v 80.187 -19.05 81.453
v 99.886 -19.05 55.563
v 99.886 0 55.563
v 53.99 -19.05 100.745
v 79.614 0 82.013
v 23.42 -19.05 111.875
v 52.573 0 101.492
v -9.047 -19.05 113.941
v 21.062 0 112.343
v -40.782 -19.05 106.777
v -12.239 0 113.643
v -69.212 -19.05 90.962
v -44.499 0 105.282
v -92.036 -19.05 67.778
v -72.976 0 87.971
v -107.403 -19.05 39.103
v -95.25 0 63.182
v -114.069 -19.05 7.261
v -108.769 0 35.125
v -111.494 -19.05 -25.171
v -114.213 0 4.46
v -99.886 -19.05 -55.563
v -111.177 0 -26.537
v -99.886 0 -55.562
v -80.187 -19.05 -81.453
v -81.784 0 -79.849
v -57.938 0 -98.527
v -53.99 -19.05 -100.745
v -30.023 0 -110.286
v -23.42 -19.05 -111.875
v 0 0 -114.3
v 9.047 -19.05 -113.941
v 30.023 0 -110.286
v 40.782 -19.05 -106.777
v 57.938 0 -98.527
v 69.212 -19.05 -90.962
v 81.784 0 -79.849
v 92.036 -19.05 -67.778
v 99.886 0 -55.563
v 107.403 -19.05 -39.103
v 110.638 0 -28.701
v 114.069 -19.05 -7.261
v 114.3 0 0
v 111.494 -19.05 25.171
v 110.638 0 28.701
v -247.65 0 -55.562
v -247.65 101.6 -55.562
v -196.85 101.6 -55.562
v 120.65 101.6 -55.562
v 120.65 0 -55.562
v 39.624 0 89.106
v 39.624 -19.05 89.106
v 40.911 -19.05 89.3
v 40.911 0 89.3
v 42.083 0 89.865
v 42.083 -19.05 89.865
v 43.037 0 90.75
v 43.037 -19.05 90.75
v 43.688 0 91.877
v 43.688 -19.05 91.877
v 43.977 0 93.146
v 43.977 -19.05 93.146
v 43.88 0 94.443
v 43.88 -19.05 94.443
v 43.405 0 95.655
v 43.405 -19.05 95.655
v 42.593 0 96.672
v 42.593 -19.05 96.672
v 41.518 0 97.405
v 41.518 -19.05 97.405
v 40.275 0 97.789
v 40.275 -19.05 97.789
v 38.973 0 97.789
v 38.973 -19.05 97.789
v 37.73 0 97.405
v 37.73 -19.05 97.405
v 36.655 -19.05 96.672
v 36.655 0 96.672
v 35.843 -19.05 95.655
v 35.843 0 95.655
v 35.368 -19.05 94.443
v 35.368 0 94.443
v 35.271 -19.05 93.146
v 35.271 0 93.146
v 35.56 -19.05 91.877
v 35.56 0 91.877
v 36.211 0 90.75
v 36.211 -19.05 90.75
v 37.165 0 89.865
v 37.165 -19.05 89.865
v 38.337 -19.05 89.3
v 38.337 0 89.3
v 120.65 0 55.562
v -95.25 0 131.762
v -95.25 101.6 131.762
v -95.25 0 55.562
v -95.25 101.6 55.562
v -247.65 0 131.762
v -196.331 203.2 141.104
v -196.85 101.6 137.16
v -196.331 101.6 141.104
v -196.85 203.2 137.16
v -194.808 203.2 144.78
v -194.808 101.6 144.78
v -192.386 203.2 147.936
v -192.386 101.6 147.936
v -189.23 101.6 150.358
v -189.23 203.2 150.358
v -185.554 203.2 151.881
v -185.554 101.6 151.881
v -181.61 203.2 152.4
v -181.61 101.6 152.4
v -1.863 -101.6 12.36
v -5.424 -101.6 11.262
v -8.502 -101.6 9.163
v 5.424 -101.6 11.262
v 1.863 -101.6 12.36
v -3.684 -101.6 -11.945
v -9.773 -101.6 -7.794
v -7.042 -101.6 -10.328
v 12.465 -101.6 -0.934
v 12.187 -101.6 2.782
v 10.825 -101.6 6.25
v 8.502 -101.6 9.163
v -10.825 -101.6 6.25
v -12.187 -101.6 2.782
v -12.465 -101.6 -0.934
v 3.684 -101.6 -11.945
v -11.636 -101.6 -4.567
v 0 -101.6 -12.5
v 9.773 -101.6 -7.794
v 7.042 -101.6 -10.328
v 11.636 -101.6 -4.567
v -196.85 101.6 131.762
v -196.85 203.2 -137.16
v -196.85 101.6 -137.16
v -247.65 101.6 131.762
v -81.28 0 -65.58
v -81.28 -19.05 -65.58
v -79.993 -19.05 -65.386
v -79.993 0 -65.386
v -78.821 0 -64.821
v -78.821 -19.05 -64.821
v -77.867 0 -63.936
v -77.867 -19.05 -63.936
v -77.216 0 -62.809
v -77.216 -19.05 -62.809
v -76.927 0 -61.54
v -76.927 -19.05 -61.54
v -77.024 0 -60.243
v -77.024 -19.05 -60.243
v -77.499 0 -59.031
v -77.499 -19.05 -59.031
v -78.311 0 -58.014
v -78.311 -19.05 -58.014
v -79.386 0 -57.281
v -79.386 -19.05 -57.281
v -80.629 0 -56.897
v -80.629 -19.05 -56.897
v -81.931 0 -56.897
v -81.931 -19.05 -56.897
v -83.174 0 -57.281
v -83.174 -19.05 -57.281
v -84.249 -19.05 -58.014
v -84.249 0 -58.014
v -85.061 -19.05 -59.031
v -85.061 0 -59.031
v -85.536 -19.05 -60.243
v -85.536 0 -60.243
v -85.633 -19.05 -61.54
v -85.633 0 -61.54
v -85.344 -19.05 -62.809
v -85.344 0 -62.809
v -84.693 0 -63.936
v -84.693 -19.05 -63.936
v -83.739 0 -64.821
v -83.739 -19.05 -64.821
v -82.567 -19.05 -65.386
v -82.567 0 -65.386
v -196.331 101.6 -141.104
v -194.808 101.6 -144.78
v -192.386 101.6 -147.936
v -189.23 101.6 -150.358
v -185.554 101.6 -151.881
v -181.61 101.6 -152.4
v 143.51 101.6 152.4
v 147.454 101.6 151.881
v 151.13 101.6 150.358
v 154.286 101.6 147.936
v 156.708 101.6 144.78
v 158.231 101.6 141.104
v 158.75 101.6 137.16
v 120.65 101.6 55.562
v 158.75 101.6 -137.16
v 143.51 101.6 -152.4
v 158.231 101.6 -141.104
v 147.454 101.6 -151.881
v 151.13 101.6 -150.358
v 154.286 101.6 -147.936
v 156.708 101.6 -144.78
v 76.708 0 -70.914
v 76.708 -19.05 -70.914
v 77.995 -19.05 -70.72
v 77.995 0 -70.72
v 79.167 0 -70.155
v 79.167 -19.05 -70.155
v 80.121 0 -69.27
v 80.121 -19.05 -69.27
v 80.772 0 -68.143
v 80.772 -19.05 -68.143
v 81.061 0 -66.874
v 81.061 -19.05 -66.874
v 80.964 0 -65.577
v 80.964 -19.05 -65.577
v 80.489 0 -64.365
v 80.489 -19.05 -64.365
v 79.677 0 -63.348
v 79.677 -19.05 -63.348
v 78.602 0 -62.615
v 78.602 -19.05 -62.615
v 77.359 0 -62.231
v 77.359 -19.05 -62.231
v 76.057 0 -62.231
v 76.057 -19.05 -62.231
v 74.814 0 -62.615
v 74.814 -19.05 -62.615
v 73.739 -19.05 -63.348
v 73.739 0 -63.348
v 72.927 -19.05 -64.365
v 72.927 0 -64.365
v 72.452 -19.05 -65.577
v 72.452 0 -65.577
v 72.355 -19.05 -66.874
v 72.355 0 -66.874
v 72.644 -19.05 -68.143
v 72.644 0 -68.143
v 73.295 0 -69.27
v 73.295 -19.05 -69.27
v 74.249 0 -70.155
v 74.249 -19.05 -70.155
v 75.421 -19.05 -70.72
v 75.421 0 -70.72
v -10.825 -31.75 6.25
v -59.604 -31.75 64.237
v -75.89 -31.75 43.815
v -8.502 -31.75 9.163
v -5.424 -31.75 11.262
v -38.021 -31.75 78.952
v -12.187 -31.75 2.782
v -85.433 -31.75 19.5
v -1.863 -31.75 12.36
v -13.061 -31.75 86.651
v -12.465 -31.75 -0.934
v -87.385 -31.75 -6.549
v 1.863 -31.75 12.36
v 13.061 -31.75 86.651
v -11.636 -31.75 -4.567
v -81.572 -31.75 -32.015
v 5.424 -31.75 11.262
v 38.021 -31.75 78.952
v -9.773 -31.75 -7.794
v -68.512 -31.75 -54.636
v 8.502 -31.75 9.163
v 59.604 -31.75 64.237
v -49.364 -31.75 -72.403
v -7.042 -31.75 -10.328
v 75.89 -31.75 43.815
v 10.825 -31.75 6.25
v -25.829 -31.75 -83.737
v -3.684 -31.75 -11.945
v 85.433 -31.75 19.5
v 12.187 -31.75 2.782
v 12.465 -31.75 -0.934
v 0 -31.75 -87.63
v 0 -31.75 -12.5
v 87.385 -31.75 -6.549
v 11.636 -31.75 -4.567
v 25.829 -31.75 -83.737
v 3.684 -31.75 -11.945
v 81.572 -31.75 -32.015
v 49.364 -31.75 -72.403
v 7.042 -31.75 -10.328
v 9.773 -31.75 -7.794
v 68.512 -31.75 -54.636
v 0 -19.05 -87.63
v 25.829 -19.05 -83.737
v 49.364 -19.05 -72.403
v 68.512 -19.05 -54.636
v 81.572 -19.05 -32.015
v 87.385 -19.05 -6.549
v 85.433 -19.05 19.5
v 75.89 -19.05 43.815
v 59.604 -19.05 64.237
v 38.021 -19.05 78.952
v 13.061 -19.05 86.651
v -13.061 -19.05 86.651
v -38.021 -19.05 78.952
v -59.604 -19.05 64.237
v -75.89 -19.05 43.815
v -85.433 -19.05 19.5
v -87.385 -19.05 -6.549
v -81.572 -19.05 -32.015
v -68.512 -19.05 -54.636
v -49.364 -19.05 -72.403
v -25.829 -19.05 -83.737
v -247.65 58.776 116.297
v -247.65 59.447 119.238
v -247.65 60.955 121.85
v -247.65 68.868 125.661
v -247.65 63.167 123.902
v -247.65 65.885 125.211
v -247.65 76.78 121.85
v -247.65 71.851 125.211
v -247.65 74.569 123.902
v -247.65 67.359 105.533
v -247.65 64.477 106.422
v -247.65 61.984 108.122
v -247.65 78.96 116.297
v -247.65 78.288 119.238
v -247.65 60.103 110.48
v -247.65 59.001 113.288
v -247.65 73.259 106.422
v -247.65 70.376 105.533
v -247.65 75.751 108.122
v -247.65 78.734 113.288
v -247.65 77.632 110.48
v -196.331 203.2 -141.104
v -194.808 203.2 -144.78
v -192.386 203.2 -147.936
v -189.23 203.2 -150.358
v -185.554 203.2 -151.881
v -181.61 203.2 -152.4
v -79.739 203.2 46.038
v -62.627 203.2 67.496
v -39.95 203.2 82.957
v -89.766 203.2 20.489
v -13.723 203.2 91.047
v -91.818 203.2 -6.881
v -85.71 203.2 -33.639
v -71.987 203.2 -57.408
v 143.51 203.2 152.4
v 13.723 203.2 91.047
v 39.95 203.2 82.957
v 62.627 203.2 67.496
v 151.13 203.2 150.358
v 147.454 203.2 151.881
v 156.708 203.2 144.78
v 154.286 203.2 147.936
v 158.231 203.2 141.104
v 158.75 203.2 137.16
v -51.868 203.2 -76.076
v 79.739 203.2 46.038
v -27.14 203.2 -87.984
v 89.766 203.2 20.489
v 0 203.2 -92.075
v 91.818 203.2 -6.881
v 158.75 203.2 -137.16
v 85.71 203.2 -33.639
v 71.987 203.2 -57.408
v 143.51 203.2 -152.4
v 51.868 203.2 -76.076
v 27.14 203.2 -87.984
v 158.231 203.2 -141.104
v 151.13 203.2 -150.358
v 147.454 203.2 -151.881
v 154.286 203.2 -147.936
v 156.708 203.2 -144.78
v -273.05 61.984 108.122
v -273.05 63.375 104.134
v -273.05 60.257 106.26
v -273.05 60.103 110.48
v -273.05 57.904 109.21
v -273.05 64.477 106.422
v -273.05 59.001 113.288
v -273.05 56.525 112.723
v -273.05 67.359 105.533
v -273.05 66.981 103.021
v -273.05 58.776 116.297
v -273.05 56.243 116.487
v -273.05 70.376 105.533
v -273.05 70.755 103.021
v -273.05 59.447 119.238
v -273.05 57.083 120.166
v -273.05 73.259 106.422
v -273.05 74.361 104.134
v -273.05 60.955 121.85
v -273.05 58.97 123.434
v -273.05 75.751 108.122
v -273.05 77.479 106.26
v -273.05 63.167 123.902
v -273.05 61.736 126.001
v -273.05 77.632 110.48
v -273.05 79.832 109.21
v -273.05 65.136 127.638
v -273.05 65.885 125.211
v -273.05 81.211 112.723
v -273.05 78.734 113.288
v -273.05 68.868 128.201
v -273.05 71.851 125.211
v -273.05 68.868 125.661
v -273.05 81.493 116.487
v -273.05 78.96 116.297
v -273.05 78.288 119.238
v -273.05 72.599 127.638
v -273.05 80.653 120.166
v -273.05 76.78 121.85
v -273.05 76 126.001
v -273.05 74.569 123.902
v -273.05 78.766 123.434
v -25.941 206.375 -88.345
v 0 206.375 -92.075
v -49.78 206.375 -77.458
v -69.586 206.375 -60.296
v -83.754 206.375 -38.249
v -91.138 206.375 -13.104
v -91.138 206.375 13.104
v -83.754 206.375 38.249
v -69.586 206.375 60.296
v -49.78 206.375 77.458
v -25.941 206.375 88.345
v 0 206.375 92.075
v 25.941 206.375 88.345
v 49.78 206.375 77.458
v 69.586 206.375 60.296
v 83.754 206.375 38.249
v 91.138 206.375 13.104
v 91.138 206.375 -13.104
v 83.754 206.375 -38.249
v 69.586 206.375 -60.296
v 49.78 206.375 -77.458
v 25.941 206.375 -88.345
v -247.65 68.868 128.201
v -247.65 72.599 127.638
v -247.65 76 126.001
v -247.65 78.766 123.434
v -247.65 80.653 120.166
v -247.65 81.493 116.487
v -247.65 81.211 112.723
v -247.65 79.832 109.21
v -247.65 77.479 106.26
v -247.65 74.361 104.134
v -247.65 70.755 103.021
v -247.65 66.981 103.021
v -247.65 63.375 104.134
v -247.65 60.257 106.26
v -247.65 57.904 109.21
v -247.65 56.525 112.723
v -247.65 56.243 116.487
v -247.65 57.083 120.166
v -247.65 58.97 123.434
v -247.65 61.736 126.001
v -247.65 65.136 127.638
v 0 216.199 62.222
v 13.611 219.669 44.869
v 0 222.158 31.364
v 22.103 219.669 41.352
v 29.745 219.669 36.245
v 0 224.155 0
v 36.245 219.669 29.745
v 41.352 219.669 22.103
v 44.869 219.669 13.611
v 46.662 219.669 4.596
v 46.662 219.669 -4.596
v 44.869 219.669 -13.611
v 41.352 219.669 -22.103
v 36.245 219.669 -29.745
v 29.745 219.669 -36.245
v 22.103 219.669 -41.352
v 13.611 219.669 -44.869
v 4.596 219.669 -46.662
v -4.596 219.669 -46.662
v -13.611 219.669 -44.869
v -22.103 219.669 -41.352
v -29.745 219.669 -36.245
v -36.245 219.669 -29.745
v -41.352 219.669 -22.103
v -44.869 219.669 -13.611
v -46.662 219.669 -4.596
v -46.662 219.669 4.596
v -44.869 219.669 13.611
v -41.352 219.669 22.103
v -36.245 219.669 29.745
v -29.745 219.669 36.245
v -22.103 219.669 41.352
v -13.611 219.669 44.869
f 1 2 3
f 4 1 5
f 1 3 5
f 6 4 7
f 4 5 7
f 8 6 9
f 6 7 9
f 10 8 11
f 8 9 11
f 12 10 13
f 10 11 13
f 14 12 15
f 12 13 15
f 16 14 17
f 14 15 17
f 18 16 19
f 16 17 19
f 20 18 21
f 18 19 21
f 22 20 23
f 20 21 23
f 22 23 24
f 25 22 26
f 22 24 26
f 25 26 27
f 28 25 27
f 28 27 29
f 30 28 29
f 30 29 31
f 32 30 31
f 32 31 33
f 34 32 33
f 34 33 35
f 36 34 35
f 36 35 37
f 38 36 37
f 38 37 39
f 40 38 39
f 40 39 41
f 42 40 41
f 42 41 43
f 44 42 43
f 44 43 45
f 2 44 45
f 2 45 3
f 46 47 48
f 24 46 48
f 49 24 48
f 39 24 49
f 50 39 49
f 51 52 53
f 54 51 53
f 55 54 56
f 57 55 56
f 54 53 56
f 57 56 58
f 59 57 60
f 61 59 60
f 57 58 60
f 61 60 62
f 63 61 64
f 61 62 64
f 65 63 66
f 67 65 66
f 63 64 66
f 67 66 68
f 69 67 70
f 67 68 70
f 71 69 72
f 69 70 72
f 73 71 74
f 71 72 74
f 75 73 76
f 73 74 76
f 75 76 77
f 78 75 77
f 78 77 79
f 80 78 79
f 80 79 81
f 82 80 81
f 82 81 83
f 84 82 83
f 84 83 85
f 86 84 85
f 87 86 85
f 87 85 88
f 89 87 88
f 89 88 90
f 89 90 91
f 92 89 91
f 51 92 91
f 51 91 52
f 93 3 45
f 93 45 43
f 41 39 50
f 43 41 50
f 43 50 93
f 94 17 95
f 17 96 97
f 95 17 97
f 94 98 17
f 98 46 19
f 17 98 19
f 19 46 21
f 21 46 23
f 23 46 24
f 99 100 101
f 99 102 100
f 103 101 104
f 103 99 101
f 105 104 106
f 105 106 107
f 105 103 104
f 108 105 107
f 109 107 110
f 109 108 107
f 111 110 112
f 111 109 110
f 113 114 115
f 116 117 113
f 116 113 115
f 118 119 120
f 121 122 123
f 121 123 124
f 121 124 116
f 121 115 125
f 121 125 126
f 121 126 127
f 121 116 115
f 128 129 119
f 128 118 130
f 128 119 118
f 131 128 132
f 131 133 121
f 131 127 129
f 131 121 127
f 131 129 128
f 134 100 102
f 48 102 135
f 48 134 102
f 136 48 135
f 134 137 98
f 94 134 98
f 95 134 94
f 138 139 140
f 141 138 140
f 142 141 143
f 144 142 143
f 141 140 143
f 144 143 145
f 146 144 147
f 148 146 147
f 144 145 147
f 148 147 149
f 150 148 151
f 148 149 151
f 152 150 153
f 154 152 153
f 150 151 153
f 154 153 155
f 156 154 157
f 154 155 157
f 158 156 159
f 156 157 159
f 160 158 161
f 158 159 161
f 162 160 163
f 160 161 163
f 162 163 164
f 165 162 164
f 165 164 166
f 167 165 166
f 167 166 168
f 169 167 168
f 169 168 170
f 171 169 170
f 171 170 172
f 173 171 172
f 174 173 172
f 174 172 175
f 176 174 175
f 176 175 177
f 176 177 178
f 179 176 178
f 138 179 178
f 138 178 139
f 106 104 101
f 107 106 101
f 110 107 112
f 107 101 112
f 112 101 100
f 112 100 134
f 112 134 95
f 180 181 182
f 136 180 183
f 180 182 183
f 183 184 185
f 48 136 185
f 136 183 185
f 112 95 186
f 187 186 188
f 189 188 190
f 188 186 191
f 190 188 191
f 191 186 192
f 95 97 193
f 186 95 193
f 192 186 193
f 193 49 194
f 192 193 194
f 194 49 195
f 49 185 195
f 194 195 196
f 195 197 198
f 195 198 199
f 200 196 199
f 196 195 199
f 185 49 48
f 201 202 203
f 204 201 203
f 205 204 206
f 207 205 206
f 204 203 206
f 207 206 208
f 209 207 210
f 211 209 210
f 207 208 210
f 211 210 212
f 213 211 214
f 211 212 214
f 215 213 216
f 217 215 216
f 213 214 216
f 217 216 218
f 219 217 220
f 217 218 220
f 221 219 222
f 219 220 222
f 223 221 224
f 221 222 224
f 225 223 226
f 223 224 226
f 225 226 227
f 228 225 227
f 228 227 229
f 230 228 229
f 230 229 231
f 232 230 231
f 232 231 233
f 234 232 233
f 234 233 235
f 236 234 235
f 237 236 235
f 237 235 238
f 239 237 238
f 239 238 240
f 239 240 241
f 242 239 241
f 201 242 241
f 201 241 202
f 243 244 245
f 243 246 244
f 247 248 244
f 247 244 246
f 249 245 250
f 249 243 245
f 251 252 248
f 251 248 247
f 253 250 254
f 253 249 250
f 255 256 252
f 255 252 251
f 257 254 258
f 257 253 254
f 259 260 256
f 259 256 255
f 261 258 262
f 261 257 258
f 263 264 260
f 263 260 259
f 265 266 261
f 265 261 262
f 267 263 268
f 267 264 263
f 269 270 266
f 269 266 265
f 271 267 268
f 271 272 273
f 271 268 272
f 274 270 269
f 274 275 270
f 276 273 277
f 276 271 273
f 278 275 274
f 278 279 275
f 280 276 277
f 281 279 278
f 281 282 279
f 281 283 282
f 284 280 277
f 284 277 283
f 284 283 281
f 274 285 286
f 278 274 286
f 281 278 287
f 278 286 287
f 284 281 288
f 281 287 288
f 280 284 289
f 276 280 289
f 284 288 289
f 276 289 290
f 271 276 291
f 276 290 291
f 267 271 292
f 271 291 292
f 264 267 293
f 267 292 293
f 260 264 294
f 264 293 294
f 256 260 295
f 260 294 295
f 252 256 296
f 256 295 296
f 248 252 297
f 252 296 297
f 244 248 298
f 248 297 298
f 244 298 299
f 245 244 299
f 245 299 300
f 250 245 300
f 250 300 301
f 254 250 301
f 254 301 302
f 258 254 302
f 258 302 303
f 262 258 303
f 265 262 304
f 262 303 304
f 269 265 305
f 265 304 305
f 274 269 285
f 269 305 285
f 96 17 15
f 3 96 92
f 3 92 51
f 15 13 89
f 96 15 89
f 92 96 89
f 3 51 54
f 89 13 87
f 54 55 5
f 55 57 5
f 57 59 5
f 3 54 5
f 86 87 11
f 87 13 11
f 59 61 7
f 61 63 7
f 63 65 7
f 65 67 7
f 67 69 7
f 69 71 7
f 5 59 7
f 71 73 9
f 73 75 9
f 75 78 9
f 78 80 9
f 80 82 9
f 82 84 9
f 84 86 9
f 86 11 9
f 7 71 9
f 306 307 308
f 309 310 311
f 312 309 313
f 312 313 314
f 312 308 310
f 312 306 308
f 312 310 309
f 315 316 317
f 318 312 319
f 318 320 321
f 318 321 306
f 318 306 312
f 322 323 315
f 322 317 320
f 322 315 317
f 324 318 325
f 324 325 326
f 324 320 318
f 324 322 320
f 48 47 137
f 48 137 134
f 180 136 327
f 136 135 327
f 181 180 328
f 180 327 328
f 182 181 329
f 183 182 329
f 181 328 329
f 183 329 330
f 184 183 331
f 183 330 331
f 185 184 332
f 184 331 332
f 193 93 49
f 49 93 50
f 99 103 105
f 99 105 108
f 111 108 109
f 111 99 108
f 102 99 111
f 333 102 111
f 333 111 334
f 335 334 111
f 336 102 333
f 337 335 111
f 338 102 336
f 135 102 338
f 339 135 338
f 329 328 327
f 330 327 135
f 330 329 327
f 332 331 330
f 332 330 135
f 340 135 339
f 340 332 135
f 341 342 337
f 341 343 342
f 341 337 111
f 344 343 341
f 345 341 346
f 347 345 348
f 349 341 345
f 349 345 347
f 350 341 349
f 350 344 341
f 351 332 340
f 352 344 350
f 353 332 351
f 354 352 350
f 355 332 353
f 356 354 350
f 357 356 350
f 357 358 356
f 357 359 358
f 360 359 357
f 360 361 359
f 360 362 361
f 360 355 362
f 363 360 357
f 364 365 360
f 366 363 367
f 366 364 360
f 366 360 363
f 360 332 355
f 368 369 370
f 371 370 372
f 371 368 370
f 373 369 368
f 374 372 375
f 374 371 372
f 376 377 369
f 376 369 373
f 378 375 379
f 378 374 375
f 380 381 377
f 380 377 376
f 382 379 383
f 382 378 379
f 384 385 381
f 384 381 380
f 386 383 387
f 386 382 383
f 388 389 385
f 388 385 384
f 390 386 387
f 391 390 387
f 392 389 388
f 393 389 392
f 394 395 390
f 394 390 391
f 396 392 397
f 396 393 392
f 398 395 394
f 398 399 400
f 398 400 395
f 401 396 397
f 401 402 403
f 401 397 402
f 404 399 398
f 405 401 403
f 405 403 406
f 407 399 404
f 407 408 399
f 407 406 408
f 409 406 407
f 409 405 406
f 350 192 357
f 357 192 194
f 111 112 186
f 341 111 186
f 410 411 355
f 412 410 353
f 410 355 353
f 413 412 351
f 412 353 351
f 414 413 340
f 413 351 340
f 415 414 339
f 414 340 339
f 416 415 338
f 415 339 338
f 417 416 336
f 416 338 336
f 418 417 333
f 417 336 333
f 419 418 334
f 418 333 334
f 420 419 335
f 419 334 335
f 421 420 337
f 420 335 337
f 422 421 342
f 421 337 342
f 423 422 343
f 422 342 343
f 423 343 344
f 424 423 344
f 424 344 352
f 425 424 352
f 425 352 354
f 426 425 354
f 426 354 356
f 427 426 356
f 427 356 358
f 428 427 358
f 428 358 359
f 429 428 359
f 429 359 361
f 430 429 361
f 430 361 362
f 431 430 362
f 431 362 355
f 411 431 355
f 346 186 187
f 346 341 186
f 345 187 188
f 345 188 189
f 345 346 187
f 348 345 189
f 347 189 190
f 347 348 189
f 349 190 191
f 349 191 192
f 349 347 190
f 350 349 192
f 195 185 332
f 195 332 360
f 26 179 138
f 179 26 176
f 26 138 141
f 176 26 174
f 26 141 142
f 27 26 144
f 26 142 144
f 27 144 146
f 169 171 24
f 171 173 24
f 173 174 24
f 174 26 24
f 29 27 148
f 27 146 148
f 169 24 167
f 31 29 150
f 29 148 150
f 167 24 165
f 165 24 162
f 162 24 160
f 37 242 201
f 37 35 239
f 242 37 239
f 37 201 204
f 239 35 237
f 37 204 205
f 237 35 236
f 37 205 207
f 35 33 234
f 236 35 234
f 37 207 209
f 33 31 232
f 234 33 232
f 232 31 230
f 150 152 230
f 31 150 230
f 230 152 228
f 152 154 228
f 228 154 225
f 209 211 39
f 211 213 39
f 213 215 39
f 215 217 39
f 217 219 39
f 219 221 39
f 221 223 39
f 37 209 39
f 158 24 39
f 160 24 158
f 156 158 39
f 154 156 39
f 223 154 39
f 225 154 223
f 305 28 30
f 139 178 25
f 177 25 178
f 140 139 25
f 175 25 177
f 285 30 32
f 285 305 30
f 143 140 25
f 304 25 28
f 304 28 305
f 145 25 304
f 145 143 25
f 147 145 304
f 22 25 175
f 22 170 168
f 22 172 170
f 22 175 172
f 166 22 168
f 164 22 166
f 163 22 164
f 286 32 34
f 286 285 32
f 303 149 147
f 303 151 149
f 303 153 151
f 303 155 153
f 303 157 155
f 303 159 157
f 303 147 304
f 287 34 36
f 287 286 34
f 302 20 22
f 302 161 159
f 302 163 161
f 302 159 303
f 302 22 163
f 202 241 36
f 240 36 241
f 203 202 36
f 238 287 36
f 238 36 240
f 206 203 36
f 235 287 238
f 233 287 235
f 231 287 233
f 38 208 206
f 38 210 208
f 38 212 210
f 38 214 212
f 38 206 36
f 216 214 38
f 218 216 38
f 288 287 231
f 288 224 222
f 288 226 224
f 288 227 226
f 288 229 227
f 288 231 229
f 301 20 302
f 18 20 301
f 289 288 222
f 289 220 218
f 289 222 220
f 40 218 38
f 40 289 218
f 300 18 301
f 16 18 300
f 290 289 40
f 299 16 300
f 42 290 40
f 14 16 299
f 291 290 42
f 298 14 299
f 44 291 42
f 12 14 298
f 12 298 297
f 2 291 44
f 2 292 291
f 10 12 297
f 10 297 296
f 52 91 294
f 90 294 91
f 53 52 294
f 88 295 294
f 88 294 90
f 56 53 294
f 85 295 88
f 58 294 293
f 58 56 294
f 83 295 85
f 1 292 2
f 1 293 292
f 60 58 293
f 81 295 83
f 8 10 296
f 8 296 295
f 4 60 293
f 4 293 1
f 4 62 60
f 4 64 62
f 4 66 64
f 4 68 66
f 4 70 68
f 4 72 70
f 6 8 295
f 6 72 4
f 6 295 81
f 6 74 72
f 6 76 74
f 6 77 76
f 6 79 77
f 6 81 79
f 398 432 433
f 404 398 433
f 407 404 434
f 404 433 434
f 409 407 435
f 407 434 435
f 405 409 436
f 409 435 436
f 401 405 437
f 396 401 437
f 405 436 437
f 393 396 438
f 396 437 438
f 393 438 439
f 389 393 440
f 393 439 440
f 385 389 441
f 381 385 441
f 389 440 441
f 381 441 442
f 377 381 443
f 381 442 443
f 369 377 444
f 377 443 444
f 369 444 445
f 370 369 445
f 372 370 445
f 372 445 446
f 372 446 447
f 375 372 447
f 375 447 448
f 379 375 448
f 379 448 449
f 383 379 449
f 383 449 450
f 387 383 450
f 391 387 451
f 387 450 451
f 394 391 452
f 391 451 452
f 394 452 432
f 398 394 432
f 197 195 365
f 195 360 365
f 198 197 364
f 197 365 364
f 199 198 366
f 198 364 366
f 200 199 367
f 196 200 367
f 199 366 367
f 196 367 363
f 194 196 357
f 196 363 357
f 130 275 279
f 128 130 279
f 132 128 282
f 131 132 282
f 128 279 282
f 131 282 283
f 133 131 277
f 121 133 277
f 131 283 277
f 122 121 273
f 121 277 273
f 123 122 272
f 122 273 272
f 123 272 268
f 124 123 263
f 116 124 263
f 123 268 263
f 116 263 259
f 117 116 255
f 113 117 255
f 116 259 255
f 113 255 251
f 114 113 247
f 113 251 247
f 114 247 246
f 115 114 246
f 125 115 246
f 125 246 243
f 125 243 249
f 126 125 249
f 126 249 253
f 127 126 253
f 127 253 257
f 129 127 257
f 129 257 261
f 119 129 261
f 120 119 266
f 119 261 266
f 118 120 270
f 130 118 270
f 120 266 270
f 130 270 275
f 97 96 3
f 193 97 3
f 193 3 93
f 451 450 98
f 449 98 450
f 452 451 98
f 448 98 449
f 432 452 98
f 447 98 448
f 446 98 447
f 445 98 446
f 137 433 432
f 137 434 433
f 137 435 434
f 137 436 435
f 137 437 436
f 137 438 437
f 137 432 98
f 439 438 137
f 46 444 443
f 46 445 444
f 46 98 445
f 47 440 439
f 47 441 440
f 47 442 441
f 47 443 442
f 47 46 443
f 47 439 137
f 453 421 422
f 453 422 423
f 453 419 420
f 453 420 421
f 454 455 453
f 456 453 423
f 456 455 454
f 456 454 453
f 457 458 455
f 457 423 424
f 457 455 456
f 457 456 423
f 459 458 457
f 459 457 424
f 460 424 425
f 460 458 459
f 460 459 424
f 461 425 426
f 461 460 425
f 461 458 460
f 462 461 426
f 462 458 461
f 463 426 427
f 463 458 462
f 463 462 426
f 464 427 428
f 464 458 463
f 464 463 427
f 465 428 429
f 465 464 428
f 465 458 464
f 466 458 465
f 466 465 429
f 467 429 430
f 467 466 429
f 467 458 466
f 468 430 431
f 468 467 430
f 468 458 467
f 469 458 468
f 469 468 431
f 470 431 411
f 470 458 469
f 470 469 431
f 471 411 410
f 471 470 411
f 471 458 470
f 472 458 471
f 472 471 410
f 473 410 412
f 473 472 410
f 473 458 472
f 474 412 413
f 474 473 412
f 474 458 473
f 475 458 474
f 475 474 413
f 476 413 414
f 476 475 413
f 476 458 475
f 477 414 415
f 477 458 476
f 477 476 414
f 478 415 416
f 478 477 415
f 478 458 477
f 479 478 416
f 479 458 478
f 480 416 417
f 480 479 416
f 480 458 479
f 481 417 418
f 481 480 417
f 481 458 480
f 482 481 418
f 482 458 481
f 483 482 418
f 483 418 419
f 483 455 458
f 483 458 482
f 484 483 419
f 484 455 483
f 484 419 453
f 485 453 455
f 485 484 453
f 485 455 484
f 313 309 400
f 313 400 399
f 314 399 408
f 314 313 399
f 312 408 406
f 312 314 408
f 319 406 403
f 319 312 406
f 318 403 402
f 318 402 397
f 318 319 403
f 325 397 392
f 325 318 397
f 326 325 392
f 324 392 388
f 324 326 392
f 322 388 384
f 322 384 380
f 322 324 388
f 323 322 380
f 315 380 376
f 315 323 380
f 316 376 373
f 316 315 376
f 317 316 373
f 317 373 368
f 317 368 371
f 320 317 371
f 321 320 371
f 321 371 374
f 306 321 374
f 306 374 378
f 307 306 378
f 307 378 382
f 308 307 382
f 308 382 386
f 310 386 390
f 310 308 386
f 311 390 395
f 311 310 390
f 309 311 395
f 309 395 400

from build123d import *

# Parameters (mm, degrees)
SKETCH1_W           = 368.3
SKETCH1_H           = 111.125
BOSS_EXTRUDE1_DEPTH = 101.6
SKETCH2_R           = 114.3
BOSS_EXTRUDE2_DEPTH = 19.05
SKETCH3_R           = 87.63
BOSS_EXTRUDE3_DEPTH = 12.7
SKETCH4_R           = 12.5
BOSS_EXTRUDE4_DEPTH = 69.85
SKETCH5_W           = 355.6
SKETCH5_H           = 304.8
BOSS_EXTRUDE5_DEPTH = 101.6
SKETCH6_R           = 92.075
BOSS_EXTRUDE6_DEPTH = 3.175
DOME1_FACE_RADIUS   = 92.075
DOME1_HEIGHT        = 17.78
FILLET1_R           = 15.24
SKETCH7_W           = 152.4
SKETCH7_H           = 101.6
BOSS_EXTRUDE7_DEPTH = 76.2
SKETCH8_R           = 12.660326574
SKETCH8_R_2         = 10.120326574
EXTRUDE_THIN1_DEPTH = 25.4
CUT_EXTRUDE1_REACH  = 245.205
SKETCH9_R           = 4.365625


with BuildPart() as part:
    # Sketch1 → Boss-Extrude1 (new body)
    with BuildSketch(Plane(origin=(0, 0, 0), x_dir=(1, 0, 0), z_dir=(0, 1, 0))):
        with Locations((-63.5, 0)):
            Rectangle(SKETCH1_W, SKETCH1_H)
    extrude(amount=BOSS_EXTRUDE1_DEPTH)

    # Sketch2 → Boss-Extrude2 (add)
    with BuildSketch(Plane.XZ):
        with Locations(Location((0, 0, 0), (0, 0, 29.085295061))):  # turned: the seam where the file's is
            Circle(SKETCH2_R)
    extrude(amount=BOSS_EXTRUDE2_DEPTH)

    # Sketch3 → Boss-Extrude3 (add)
    with BuildSketch(Plane.XZ.offset(19.05)):
        with Locations(Location((0, 0, 0), (0, 0, 270))):  # turned: the seam where the file's is
            Circle(SKETCH3_R)
    extrude(amount=BOSS_EXTRUDE3_DEPTH)

    # Sketch4 → Boss-Extrude4 (add)
    with BuildSketch(Plane.XZ.offset(31.75)):
        with Locations(Location((0, 0, 0), (0, 0, 270))):  # turned: the seam where the file's is
            Circle(SKETCH4_R)
    extrude(amount=BOSS_EXTRUDE4_DEPTH)

    # Sketch5 → Boss-Extrude5 (add)
    with BuildSketch(Plane(origin=(0, 101.6, 0), x_dir=(1, 0, 0), z_dir=(0, 1, 0))):
        with Locations((-19.05, 0)):
            Rectangle(SKETCH5_W, SKETCH5_H)
    extrude(amount=BOSS_EXTRUDE5_DEPTH)

    # Sketch6 → Boss-Extrude6 (add)
    with BuildSketch(Plane(origin=(0, 203.2, 0), x_dir=(1, 0, 0), z_dir=(0, 1, 0))):
        with Locations(Location((0, 0, 0), (0, 0, 90))):  # turned: the seam where the file's is
            Circle(SKETCH6_R)
    extrude(amount=BOSS_EXTRUDE6_DEPTH)

    # Dome1: a dome of height H over a round flat face of radius A is a cap of a sphere of radius (A * A + H * H) / (2 * H)
    dome1_r = (DOME1_FACE_RADIUS * DOME1_FACE_RADIUS + DOME1_HEIGHT * DOME1_HEIGHT) / (2 * DOME1_HEIGHT)
    dome1_base = Plane((0, 206.375, 0), z_dir=(0, 1, 0))
    with Locations(dome1_base.offset(DOME1_HEIGHT - dome1_r)):
        dome1_ball = Sphere(dome1_r, mode=Mode.PRIVATE)
    add(split(dome1_ball, bisect_by=dome1_base, keep=Keep.TOP, mode=Mode.PRIVATE))

    # Fillet1
    fillet1_edges = [part.edges().sort_by_distance(p)[0] for p in [
        (158.75, 152.4, 152.4),
        (158.75, 152.4, -152.4),
        (-196.85, 152.4, -152.4),
        (-196.85, 152.4, 152.4),
    ]]
    fillet(fillet1_edges, radius=FILLET1_R)

    # Sketch7 → Boss-Extrude7 (add)
    with BuildSketch(Plane.XY.offset(55.5625)):
        with Locations((-171.45, 50.8)):
            Rectangle(SKETCH7_W, SKETCH7_H)
    extrude(amount=BOSS_EXTRUDE7_DEPTH)

    # Sketch8 → Extrude-Thin1 (add)
    with BuildSketch(Plane.ZY.offset(247.65)):
        with Locations((115.540395057, 68.867744931)):
            Circle(SKETCH8_R)
        with Locations((115.540395057, 68.867744931)):
            Circle(SKETCH8_R_2, mode=Mode.SUBTRACT)
    extrude(amount=EXTRUDE_THIN1_DEPTH)

    # Sketch9 → Cut-Extrude1 (cut, up to next)
    with BuildSketch(Plane.XZ.offset(19.05), mode=Mode.PRIVATE) as cut_extrude1_sk1:
        with Locations(Location((39.624, 93.472, 0), (0, 0, 270))):  # turned: the seam where the file's is
            Circle(SKETCH9_R)
    cut_extrude1_tool1 = extrude(cut_extrude1_sk1.sketch, amount=-CUT_EXTRUDE1_REACH, mode=Mode.PRIVATE) & part.part
    add(cut_extrude1_tool1.solids().sort_by_distance((39.624, -19.05, 93.472))[0], mode=Mode.SUBTRACT)
    # Sketch9 → Cut-Extrude1 (cut, up to next)
    with BuildSketch(Plane.XZ.offset(19.05), mode=Mode.PRIVATE) as cut_extrude1_sk2:
        with Locations(Location((76.708, -66.548, 0), (0, 0, 270))):  # turned: the seam where the file's is
            Circle(SKETCH9_R)
    cut_extrude1_tool2 = extrude(cut_extrude1_sk2.sketch, amount=-CUT_EXTRUDE1_REACH, mode=Mode.PRIVATE) & part.part
    add(cut_extrude1_tool2.solids().sort_by_distance((76.708, -19.05, -66.548))[0], mode=Mode.SUBTRACT)
    # Sketch9 → Cut-Extrude1 (cut, up to next)
    with BuildSketch(Plane.XZ.offset(19.05), mode=Mode.PRIVATE) as cut_extrude1_sk3:
        with Locations(Location((-81.28, -61.214, 0), (0, 0, 270))):  # turned: the seam where the file's is
            Circle(SKETCH9_R)
    cut_extrude1_tool3 = extrude(cut_extrude1_sk3.sketch, amount=-CUT_EXTRUDE1_REACH, mode=Mode.PRIVATE) & part.part
    add(cut_extrude1_tool3.solids().sort_by_distance((-81.28, -19.05, -61.214))[0], mode=Mode.SUBTRACT)


solid = part.part
